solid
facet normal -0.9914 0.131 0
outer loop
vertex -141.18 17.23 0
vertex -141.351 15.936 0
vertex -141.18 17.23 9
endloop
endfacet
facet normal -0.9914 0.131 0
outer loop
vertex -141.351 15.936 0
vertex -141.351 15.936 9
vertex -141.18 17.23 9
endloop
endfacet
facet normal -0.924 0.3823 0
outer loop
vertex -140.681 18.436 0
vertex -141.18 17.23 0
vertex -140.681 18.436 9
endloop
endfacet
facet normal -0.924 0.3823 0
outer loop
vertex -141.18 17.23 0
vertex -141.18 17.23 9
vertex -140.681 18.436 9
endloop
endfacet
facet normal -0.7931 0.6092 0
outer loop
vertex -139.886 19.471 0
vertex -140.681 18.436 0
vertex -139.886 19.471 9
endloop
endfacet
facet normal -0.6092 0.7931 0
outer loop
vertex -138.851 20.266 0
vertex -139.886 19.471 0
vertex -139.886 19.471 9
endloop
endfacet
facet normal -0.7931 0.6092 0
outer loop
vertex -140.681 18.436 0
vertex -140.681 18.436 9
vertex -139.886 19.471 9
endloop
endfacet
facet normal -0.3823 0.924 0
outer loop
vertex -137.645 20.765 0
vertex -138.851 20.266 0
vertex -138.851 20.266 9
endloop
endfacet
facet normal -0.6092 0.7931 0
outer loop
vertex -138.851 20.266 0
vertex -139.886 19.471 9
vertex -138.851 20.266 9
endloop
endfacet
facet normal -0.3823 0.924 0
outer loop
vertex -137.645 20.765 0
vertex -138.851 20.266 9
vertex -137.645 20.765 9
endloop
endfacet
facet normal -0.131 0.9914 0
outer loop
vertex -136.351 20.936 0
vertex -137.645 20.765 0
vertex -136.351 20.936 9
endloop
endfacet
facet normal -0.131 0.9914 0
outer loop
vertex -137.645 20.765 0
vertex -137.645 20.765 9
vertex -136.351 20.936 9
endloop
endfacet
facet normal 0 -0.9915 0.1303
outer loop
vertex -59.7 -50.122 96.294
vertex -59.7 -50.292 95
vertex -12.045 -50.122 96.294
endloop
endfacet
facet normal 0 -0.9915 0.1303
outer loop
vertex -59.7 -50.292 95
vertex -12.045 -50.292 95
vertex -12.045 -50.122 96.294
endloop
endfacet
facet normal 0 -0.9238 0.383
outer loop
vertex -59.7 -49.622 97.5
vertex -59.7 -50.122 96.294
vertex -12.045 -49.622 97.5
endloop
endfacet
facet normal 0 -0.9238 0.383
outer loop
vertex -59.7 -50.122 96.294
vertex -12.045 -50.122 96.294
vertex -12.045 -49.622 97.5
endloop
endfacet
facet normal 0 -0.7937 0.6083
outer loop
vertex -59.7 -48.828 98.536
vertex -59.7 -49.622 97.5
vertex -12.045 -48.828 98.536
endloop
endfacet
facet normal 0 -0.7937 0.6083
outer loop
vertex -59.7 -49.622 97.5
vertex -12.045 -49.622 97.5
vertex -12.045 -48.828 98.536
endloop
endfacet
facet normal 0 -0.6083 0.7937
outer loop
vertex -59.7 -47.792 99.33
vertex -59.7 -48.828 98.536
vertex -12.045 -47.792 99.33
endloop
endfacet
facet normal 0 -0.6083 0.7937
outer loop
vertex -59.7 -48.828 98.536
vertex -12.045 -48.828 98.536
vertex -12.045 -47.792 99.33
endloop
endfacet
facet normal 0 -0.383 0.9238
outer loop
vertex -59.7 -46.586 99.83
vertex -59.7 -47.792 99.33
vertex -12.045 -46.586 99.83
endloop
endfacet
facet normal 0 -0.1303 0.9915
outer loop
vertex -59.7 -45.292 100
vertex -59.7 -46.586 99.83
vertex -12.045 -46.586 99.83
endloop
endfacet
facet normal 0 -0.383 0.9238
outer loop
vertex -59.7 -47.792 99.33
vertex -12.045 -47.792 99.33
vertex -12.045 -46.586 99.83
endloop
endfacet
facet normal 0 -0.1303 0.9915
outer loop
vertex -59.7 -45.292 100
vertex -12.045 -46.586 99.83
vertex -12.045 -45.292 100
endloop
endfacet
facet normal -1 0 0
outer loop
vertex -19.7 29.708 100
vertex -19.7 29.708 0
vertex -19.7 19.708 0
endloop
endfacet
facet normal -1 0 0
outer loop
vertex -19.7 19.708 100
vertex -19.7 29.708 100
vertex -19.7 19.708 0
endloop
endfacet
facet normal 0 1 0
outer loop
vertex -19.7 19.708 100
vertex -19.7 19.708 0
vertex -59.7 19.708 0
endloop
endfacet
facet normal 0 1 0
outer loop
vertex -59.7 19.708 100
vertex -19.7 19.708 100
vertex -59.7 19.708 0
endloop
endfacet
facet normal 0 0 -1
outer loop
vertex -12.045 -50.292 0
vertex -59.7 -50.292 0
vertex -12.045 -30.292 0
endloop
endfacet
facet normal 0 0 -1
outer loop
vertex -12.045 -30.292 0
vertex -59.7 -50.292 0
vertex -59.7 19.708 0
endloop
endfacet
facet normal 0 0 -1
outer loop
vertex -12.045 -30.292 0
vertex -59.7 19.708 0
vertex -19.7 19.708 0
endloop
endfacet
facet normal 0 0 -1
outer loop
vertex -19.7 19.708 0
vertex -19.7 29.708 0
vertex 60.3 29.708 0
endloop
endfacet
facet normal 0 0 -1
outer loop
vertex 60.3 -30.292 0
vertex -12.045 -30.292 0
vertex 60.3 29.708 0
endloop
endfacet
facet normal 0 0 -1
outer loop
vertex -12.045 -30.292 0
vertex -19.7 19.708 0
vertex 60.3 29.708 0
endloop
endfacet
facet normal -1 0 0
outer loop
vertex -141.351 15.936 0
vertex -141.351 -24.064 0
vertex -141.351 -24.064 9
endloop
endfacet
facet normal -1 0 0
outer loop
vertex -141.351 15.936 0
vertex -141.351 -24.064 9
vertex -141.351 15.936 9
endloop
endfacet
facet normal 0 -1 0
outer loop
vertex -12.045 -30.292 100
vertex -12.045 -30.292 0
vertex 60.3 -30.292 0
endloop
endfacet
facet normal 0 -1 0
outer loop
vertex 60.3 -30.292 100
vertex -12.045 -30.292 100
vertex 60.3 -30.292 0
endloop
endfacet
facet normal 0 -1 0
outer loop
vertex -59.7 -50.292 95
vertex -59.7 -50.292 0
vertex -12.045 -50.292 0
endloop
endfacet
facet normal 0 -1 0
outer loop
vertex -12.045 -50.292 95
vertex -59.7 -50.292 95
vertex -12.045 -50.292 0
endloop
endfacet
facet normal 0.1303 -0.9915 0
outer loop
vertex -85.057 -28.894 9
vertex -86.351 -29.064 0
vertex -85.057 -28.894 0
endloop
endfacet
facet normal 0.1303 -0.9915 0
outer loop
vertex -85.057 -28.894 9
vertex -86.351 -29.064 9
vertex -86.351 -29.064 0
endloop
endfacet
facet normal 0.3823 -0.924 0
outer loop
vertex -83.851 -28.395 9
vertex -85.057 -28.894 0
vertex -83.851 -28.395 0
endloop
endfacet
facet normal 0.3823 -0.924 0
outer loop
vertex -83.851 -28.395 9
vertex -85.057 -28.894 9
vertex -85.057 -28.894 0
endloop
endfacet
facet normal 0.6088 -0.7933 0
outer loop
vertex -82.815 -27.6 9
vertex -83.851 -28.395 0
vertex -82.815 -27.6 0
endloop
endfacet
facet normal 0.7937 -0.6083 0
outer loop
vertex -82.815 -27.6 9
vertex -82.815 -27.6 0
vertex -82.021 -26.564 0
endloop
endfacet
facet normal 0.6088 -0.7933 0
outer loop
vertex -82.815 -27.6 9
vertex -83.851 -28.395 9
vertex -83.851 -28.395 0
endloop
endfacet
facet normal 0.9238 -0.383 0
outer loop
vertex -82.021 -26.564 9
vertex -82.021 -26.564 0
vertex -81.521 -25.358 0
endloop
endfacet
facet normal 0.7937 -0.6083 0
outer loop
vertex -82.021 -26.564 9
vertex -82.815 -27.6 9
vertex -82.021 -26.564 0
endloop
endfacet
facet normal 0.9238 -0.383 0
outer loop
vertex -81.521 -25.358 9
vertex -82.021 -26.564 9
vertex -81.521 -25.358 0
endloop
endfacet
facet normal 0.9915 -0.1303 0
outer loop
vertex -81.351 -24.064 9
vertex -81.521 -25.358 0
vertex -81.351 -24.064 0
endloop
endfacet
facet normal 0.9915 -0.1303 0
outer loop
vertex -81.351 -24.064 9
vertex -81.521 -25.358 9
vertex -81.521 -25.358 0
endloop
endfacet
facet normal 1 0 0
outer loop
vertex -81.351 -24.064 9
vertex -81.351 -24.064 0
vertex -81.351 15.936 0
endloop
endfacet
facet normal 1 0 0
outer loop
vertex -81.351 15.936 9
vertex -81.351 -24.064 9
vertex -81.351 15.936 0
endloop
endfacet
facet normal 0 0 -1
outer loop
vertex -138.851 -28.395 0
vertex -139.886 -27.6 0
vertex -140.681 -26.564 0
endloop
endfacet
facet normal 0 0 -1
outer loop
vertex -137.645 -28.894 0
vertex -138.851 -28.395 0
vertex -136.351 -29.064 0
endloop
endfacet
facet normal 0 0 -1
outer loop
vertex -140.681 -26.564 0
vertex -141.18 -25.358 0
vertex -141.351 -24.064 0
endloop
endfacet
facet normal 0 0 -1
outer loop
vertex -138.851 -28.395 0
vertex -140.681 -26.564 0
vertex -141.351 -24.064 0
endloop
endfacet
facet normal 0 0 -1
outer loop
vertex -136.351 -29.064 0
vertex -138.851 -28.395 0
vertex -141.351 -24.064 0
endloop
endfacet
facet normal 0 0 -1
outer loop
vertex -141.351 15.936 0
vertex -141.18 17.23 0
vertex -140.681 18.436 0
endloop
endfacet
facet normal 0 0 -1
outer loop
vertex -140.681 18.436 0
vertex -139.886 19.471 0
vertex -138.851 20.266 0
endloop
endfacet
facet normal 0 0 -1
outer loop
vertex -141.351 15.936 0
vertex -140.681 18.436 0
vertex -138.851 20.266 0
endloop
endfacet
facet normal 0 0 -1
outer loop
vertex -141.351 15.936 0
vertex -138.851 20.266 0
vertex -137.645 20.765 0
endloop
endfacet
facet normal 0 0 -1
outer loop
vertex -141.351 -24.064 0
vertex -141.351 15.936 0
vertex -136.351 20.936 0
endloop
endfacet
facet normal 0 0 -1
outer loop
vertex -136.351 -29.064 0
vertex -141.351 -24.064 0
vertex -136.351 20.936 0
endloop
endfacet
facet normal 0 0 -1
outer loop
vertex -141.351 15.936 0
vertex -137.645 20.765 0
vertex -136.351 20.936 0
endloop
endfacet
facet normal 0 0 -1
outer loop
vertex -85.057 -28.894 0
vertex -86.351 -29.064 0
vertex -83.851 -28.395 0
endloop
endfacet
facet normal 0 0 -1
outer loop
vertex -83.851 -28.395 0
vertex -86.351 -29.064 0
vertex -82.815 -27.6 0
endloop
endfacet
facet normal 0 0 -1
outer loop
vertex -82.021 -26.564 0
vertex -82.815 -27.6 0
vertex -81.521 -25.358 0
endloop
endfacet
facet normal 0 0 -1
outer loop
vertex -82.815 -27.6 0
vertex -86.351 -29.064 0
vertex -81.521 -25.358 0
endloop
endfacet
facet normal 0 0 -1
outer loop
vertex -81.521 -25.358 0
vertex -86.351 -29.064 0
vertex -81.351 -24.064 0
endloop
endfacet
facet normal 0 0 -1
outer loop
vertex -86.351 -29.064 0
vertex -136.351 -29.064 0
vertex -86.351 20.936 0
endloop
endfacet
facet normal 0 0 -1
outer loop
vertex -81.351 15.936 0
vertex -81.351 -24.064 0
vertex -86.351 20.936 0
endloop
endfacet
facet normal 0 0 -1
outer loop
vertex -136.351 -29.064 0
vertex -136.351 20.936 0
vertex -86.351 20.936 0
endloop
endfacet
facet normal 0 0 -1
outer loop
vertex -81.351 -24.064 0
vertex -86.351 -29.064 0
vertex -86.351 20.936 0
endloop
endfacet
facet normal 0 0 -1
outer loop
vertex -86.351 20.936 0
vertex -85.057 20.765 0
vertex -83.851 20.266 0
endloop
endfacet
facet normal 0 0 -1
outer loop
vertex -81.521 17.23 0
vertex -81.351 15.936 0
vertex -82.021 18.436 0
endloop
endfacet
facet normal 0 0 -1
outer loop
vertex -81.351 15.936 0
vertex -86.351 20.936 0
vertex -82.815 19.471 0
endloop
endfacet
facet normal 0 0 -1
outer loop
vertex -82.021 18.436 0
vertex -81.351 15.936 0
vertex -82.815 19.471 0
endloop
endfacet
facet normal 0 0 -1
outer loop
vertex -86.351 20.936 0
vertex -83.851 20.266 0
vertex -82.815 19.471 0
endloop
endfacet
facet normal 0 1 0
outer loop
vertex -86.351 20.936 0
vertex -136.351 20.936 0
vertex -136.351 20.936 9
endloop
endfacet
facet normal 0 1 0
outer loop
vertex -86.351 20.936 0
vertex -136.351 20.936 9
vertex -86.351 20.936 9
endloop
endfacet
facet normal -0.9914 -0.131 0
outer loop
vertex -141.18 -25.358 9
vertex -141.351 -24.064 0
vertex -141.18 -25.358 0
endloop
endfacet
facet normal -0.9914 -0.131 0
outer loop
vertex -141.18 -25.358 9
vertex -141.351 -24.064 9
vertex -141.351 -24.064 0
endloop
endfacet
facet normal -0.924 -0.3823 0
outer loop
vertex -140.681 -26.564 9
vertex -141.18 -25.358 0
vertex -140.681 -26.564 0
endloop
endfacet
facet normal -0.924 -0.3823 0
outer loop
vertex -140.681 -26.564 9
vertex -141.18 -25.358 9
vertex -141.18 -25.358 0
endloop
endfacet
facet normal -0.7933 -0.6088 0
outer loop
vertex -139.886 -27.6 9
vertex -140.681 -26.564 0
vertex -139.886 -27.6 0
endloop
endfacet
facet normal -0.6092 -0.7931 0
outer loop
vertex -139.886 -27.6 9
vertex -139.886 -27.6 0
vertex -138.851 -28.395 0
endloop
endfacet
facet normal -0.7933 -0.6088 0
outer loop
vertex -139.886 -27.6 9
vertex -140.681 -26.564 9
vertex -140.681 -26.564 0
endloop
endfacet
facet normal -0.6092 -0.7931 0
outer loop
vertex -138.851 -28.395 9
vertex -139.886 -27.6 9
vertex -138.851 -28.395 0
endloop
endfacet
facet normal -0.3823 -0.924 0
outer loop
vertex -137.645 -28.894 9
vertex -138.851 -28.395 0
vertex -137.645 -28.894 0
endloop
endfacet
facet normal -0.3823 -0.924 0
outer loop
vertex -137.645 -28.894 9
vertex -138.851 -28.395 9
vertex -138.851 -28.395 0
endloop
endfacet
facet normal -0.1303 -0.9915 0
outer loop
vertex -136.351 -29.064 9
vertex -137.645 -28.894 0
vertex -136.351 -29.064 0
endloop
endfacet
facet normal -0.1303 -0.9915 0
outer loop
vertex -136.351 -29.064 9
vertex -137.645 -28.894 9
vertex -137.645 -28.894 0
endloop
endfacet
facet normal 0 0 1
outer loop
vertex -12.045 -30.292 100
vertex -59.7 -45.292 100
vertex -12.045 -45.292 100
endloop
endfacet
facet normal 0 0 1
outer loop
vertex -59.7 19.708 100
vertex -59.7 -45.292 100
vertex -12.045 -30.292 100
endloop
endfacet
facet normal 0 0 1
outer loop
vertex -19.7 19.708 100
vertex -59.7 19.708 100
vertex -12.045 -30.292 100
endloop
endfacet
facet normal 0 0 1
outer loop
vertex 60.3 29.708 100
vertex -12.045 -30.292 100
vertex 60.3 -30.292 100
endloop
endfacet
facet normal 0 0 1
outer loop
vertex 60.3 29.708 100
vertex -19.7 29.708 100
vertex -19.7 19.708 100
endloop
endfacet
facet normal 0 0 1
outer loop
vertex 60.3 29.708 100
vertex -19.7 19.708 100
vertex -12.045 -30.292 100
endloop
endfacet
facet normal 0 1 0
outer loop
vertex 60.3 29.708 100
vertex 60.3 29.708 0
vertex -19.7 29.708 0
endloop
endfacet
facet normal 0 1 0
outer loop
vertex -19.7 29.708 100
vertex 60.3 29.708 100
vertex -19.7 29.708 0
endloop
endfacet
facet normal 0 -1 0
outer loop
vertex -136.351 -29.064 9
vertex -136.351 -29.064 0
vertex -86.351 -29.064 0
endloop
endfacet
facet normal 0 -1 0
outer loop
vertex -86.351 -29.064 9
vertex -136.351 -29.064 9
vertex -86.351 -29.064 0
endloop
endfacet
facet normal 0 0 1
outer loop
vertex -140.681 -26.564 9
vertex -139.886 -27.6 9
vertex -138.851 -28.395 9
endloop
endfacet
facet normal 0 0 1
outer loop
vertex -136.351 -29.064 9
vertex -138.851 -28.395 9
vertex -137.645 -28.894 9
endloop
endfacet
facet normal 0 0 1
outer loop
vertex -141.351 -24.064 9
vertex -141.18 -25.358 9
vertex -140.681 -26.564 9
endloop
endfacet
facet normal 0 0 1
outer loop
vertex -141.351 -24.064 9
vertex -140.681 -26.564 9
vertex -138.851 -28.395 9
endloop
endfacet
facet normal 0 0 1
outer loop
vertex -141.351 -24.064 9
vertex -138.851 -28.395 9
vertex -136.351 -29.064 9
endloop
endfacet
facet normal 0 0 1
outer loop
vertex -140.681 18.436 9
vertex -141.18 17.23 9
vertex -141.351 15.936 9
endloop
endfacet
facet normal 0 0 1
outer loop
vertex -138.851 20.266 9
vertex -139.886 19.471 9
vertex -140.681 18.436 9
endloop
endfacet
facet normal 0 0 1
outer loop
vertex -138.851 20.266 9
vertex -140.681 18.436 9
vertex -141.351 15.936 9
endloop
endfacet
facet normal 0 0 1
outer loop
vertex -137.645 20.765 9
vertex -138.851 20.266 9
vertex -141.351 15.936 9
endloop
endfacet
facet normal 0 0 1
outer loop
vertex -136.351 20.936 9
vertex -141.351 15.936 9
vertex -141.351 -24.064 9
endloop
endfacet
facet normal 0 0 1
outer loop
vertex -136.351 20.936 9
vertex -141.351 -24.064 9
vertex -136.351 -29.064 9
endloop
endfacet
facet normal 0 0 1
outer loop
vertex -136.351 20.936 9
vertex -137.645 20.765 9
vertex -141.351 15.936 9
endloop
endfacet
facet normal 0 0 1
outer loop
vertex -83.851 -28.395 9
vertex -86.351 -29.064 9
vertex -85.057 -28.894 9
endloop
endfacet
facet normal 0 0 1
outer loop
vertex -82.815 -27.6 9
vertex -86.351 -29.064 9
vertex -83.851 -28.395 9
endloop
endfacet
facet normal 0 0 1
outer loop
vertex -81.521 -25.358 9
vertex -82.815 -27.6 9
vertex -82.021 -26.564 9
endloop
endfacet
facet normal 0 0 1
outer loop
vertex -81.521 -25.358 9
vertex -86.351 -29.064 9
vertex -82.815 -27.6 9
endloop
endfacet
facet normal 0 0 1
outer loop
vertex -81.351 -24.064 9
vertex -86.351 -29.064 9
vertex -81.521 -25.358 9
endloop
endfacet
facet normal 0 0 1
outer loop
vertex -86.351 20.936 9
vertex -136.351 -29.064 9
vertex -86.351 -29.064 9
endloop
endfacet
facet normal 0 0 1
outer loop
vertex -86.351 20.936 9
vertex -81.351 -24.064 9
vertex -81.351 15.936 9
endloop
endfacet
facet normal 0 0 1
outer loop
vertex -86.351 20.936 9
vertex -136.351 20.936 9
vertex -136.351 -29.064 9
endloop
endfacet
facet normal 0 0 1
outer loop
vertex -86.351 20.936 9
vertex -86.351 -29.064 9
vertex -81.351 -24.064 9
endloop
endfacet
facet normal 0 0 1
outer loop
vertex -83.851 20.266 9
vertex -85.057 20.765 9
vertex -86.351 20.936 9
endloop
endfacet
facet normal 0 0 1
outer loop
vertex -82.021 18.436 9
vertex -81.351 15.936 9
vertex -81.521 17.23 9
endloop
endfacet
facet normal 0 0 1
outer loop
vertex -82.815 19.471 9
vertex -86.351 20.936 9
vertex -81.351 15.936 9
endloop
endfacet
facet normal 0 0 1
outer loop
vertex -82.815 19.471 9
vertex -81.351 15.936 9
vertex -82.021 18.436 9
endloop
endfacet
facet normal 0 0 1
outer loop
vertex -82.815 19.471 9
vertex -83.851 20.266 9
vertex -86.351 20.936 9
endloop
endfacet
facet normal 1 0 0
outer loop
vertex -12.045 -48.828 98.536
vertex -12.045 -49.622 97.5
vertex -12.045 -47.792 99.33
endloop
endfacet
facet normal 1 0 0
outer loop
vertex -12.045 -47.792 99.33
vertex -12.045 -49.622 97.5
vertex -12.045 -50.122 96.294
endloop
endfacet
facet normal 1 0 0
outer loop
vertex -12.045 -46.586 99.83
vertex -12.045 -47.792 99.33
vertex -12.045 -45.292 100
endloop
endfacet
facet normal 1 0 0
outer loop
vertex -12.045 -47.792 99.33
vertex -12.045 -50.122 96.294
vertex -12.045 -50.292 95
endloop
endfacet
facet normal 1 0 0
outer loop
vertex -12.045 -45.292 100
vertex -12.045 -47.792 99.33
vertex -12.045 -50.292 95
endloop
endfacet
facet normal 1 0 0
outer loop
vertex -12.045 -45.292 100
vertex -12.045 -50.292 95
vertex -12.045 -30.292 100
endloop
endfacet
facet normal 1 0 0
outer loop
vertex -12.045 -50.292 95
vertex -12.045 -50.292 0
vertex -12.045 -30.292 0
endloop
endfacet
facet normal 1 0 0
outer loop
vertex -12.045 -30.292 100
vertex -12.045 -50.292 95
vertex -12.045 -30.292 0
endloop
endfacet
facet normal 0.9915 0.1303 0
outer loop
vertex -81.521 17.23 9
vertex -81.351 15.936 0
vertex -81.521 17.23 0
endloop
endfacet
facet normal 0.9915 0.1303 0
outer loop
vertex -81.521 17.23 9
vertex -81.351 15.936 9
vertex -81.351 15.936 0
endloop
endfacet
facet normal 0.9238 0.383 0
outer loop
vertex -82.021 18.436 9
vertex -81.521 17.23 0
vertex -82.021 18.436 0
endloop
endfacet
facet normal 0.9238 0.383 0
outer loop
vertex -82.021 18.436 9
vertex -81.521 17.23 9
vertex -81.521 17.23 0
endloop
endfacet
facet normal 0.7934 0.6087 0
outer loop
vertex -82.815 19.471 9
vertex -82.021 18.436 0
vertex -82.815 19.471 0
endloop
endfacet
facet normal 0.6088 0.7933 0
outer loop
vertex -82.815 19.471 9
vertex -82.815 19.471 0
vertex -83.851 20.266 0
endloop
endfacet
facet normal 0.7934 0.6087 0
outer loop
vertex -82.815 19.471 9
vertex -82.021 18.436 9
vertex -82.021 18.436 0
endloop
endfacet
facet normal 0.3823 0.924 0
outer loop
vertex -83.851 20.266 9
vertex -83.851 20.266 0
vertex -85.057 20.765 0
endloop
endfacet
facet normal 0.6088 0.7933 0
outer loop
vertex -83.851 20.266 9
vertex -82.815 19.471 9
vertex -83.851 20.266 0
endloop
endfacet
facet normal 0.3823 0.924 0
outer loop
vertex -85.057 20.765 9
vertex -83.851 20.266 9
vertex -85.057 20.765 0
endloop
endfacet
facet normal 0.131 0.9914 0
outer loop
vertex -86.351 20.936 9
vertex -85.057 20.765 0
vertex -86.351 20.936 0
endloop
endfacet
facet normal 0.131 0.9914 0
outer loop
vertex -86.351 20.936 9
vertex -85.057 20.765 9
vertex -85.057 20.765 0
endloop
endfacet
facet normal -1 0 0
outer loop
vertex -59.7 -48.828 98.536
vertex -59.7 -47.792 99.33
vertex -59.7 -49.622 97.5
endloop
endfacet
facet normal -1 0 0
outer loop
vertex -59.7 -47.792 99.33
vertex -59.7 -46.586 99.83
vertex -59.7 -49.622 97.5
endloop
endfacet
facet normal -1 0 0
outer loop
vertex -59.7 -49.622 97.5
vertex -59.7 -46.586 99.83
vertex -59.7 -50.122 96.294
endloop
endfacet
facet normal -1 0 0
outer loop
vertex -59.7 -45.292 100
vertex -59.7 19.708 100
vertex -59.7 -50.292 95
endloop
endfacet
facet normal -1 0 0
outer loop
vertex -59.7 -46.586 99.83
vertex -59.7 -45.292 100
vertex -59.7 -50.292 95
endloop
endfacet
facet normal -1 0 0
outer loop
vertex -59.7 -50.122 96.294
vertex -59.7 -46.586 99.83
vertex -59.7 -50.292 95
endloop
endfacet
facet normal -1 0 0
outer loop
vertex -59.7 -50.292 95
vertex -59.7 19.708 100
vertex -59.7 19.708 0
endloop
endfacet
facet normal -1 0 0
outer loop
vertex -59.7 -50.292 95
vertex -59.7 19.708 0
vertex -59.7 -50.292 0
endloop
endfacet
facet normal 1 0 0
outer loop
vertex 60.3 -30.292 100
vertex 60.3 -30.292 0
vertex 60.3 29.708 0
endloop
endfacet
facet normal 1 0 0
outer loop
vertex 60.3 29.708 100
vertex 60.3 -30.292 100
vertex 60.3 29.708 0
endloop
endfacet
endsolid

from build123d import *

# Parameters (mm, degrees)
F1_DEPTH = 100
F2_R     = 5
F3_W     = 60
F3_H     = 49.999997
F4_DEPTH = 9
F5_R     = 5


with BuildPart() as f1:
    # F0 (on Top) → F1 (new body)
    with BuildSketch(Plane.XY):
        Polygon((60.30023, 29.707996), (-19.69977, 29.707996), (-19.69977, 19.707996), (-59.69977, 19.707996), (-59.69977, -50.292004), (-12.045462, -50.292004), (-12.045462, -30.292004), (60.30023, -30.292004), align=None)
    extrude(amount=F1_DEPTH)

    # F2
    f2_edges = [f1.edges().sort_by_distance(p)[0] for p in [
        (-35.872616, -50.292004, 100),
    ]]
    fillet(f2_edges, radius=F2_R)


with BuildPart() as f4:
    # F3 (on Top) → F4 (new body)
    with BuildSketch(Plane.XY):
        with Locations((-111.350864, -4.064405)):
            Rectangle(F3_W, F3_H)
    extrude(amount=F4_DEPTH)

    # F5
    f5_edges = [f4.edges().sort_by_distance(p)[0] for p in [
        (-141.350864, 20.935594, 4.5),
        (-141.350864, -29.064403, 4.5),
        (-81.350864, -29.064403, 4.5),
        (-81.350864, 20.935594, 4.5),
    ]]
    fillet(f5_edges, radius=F5_R)


solid = Compound([f1.part, f4.part])
